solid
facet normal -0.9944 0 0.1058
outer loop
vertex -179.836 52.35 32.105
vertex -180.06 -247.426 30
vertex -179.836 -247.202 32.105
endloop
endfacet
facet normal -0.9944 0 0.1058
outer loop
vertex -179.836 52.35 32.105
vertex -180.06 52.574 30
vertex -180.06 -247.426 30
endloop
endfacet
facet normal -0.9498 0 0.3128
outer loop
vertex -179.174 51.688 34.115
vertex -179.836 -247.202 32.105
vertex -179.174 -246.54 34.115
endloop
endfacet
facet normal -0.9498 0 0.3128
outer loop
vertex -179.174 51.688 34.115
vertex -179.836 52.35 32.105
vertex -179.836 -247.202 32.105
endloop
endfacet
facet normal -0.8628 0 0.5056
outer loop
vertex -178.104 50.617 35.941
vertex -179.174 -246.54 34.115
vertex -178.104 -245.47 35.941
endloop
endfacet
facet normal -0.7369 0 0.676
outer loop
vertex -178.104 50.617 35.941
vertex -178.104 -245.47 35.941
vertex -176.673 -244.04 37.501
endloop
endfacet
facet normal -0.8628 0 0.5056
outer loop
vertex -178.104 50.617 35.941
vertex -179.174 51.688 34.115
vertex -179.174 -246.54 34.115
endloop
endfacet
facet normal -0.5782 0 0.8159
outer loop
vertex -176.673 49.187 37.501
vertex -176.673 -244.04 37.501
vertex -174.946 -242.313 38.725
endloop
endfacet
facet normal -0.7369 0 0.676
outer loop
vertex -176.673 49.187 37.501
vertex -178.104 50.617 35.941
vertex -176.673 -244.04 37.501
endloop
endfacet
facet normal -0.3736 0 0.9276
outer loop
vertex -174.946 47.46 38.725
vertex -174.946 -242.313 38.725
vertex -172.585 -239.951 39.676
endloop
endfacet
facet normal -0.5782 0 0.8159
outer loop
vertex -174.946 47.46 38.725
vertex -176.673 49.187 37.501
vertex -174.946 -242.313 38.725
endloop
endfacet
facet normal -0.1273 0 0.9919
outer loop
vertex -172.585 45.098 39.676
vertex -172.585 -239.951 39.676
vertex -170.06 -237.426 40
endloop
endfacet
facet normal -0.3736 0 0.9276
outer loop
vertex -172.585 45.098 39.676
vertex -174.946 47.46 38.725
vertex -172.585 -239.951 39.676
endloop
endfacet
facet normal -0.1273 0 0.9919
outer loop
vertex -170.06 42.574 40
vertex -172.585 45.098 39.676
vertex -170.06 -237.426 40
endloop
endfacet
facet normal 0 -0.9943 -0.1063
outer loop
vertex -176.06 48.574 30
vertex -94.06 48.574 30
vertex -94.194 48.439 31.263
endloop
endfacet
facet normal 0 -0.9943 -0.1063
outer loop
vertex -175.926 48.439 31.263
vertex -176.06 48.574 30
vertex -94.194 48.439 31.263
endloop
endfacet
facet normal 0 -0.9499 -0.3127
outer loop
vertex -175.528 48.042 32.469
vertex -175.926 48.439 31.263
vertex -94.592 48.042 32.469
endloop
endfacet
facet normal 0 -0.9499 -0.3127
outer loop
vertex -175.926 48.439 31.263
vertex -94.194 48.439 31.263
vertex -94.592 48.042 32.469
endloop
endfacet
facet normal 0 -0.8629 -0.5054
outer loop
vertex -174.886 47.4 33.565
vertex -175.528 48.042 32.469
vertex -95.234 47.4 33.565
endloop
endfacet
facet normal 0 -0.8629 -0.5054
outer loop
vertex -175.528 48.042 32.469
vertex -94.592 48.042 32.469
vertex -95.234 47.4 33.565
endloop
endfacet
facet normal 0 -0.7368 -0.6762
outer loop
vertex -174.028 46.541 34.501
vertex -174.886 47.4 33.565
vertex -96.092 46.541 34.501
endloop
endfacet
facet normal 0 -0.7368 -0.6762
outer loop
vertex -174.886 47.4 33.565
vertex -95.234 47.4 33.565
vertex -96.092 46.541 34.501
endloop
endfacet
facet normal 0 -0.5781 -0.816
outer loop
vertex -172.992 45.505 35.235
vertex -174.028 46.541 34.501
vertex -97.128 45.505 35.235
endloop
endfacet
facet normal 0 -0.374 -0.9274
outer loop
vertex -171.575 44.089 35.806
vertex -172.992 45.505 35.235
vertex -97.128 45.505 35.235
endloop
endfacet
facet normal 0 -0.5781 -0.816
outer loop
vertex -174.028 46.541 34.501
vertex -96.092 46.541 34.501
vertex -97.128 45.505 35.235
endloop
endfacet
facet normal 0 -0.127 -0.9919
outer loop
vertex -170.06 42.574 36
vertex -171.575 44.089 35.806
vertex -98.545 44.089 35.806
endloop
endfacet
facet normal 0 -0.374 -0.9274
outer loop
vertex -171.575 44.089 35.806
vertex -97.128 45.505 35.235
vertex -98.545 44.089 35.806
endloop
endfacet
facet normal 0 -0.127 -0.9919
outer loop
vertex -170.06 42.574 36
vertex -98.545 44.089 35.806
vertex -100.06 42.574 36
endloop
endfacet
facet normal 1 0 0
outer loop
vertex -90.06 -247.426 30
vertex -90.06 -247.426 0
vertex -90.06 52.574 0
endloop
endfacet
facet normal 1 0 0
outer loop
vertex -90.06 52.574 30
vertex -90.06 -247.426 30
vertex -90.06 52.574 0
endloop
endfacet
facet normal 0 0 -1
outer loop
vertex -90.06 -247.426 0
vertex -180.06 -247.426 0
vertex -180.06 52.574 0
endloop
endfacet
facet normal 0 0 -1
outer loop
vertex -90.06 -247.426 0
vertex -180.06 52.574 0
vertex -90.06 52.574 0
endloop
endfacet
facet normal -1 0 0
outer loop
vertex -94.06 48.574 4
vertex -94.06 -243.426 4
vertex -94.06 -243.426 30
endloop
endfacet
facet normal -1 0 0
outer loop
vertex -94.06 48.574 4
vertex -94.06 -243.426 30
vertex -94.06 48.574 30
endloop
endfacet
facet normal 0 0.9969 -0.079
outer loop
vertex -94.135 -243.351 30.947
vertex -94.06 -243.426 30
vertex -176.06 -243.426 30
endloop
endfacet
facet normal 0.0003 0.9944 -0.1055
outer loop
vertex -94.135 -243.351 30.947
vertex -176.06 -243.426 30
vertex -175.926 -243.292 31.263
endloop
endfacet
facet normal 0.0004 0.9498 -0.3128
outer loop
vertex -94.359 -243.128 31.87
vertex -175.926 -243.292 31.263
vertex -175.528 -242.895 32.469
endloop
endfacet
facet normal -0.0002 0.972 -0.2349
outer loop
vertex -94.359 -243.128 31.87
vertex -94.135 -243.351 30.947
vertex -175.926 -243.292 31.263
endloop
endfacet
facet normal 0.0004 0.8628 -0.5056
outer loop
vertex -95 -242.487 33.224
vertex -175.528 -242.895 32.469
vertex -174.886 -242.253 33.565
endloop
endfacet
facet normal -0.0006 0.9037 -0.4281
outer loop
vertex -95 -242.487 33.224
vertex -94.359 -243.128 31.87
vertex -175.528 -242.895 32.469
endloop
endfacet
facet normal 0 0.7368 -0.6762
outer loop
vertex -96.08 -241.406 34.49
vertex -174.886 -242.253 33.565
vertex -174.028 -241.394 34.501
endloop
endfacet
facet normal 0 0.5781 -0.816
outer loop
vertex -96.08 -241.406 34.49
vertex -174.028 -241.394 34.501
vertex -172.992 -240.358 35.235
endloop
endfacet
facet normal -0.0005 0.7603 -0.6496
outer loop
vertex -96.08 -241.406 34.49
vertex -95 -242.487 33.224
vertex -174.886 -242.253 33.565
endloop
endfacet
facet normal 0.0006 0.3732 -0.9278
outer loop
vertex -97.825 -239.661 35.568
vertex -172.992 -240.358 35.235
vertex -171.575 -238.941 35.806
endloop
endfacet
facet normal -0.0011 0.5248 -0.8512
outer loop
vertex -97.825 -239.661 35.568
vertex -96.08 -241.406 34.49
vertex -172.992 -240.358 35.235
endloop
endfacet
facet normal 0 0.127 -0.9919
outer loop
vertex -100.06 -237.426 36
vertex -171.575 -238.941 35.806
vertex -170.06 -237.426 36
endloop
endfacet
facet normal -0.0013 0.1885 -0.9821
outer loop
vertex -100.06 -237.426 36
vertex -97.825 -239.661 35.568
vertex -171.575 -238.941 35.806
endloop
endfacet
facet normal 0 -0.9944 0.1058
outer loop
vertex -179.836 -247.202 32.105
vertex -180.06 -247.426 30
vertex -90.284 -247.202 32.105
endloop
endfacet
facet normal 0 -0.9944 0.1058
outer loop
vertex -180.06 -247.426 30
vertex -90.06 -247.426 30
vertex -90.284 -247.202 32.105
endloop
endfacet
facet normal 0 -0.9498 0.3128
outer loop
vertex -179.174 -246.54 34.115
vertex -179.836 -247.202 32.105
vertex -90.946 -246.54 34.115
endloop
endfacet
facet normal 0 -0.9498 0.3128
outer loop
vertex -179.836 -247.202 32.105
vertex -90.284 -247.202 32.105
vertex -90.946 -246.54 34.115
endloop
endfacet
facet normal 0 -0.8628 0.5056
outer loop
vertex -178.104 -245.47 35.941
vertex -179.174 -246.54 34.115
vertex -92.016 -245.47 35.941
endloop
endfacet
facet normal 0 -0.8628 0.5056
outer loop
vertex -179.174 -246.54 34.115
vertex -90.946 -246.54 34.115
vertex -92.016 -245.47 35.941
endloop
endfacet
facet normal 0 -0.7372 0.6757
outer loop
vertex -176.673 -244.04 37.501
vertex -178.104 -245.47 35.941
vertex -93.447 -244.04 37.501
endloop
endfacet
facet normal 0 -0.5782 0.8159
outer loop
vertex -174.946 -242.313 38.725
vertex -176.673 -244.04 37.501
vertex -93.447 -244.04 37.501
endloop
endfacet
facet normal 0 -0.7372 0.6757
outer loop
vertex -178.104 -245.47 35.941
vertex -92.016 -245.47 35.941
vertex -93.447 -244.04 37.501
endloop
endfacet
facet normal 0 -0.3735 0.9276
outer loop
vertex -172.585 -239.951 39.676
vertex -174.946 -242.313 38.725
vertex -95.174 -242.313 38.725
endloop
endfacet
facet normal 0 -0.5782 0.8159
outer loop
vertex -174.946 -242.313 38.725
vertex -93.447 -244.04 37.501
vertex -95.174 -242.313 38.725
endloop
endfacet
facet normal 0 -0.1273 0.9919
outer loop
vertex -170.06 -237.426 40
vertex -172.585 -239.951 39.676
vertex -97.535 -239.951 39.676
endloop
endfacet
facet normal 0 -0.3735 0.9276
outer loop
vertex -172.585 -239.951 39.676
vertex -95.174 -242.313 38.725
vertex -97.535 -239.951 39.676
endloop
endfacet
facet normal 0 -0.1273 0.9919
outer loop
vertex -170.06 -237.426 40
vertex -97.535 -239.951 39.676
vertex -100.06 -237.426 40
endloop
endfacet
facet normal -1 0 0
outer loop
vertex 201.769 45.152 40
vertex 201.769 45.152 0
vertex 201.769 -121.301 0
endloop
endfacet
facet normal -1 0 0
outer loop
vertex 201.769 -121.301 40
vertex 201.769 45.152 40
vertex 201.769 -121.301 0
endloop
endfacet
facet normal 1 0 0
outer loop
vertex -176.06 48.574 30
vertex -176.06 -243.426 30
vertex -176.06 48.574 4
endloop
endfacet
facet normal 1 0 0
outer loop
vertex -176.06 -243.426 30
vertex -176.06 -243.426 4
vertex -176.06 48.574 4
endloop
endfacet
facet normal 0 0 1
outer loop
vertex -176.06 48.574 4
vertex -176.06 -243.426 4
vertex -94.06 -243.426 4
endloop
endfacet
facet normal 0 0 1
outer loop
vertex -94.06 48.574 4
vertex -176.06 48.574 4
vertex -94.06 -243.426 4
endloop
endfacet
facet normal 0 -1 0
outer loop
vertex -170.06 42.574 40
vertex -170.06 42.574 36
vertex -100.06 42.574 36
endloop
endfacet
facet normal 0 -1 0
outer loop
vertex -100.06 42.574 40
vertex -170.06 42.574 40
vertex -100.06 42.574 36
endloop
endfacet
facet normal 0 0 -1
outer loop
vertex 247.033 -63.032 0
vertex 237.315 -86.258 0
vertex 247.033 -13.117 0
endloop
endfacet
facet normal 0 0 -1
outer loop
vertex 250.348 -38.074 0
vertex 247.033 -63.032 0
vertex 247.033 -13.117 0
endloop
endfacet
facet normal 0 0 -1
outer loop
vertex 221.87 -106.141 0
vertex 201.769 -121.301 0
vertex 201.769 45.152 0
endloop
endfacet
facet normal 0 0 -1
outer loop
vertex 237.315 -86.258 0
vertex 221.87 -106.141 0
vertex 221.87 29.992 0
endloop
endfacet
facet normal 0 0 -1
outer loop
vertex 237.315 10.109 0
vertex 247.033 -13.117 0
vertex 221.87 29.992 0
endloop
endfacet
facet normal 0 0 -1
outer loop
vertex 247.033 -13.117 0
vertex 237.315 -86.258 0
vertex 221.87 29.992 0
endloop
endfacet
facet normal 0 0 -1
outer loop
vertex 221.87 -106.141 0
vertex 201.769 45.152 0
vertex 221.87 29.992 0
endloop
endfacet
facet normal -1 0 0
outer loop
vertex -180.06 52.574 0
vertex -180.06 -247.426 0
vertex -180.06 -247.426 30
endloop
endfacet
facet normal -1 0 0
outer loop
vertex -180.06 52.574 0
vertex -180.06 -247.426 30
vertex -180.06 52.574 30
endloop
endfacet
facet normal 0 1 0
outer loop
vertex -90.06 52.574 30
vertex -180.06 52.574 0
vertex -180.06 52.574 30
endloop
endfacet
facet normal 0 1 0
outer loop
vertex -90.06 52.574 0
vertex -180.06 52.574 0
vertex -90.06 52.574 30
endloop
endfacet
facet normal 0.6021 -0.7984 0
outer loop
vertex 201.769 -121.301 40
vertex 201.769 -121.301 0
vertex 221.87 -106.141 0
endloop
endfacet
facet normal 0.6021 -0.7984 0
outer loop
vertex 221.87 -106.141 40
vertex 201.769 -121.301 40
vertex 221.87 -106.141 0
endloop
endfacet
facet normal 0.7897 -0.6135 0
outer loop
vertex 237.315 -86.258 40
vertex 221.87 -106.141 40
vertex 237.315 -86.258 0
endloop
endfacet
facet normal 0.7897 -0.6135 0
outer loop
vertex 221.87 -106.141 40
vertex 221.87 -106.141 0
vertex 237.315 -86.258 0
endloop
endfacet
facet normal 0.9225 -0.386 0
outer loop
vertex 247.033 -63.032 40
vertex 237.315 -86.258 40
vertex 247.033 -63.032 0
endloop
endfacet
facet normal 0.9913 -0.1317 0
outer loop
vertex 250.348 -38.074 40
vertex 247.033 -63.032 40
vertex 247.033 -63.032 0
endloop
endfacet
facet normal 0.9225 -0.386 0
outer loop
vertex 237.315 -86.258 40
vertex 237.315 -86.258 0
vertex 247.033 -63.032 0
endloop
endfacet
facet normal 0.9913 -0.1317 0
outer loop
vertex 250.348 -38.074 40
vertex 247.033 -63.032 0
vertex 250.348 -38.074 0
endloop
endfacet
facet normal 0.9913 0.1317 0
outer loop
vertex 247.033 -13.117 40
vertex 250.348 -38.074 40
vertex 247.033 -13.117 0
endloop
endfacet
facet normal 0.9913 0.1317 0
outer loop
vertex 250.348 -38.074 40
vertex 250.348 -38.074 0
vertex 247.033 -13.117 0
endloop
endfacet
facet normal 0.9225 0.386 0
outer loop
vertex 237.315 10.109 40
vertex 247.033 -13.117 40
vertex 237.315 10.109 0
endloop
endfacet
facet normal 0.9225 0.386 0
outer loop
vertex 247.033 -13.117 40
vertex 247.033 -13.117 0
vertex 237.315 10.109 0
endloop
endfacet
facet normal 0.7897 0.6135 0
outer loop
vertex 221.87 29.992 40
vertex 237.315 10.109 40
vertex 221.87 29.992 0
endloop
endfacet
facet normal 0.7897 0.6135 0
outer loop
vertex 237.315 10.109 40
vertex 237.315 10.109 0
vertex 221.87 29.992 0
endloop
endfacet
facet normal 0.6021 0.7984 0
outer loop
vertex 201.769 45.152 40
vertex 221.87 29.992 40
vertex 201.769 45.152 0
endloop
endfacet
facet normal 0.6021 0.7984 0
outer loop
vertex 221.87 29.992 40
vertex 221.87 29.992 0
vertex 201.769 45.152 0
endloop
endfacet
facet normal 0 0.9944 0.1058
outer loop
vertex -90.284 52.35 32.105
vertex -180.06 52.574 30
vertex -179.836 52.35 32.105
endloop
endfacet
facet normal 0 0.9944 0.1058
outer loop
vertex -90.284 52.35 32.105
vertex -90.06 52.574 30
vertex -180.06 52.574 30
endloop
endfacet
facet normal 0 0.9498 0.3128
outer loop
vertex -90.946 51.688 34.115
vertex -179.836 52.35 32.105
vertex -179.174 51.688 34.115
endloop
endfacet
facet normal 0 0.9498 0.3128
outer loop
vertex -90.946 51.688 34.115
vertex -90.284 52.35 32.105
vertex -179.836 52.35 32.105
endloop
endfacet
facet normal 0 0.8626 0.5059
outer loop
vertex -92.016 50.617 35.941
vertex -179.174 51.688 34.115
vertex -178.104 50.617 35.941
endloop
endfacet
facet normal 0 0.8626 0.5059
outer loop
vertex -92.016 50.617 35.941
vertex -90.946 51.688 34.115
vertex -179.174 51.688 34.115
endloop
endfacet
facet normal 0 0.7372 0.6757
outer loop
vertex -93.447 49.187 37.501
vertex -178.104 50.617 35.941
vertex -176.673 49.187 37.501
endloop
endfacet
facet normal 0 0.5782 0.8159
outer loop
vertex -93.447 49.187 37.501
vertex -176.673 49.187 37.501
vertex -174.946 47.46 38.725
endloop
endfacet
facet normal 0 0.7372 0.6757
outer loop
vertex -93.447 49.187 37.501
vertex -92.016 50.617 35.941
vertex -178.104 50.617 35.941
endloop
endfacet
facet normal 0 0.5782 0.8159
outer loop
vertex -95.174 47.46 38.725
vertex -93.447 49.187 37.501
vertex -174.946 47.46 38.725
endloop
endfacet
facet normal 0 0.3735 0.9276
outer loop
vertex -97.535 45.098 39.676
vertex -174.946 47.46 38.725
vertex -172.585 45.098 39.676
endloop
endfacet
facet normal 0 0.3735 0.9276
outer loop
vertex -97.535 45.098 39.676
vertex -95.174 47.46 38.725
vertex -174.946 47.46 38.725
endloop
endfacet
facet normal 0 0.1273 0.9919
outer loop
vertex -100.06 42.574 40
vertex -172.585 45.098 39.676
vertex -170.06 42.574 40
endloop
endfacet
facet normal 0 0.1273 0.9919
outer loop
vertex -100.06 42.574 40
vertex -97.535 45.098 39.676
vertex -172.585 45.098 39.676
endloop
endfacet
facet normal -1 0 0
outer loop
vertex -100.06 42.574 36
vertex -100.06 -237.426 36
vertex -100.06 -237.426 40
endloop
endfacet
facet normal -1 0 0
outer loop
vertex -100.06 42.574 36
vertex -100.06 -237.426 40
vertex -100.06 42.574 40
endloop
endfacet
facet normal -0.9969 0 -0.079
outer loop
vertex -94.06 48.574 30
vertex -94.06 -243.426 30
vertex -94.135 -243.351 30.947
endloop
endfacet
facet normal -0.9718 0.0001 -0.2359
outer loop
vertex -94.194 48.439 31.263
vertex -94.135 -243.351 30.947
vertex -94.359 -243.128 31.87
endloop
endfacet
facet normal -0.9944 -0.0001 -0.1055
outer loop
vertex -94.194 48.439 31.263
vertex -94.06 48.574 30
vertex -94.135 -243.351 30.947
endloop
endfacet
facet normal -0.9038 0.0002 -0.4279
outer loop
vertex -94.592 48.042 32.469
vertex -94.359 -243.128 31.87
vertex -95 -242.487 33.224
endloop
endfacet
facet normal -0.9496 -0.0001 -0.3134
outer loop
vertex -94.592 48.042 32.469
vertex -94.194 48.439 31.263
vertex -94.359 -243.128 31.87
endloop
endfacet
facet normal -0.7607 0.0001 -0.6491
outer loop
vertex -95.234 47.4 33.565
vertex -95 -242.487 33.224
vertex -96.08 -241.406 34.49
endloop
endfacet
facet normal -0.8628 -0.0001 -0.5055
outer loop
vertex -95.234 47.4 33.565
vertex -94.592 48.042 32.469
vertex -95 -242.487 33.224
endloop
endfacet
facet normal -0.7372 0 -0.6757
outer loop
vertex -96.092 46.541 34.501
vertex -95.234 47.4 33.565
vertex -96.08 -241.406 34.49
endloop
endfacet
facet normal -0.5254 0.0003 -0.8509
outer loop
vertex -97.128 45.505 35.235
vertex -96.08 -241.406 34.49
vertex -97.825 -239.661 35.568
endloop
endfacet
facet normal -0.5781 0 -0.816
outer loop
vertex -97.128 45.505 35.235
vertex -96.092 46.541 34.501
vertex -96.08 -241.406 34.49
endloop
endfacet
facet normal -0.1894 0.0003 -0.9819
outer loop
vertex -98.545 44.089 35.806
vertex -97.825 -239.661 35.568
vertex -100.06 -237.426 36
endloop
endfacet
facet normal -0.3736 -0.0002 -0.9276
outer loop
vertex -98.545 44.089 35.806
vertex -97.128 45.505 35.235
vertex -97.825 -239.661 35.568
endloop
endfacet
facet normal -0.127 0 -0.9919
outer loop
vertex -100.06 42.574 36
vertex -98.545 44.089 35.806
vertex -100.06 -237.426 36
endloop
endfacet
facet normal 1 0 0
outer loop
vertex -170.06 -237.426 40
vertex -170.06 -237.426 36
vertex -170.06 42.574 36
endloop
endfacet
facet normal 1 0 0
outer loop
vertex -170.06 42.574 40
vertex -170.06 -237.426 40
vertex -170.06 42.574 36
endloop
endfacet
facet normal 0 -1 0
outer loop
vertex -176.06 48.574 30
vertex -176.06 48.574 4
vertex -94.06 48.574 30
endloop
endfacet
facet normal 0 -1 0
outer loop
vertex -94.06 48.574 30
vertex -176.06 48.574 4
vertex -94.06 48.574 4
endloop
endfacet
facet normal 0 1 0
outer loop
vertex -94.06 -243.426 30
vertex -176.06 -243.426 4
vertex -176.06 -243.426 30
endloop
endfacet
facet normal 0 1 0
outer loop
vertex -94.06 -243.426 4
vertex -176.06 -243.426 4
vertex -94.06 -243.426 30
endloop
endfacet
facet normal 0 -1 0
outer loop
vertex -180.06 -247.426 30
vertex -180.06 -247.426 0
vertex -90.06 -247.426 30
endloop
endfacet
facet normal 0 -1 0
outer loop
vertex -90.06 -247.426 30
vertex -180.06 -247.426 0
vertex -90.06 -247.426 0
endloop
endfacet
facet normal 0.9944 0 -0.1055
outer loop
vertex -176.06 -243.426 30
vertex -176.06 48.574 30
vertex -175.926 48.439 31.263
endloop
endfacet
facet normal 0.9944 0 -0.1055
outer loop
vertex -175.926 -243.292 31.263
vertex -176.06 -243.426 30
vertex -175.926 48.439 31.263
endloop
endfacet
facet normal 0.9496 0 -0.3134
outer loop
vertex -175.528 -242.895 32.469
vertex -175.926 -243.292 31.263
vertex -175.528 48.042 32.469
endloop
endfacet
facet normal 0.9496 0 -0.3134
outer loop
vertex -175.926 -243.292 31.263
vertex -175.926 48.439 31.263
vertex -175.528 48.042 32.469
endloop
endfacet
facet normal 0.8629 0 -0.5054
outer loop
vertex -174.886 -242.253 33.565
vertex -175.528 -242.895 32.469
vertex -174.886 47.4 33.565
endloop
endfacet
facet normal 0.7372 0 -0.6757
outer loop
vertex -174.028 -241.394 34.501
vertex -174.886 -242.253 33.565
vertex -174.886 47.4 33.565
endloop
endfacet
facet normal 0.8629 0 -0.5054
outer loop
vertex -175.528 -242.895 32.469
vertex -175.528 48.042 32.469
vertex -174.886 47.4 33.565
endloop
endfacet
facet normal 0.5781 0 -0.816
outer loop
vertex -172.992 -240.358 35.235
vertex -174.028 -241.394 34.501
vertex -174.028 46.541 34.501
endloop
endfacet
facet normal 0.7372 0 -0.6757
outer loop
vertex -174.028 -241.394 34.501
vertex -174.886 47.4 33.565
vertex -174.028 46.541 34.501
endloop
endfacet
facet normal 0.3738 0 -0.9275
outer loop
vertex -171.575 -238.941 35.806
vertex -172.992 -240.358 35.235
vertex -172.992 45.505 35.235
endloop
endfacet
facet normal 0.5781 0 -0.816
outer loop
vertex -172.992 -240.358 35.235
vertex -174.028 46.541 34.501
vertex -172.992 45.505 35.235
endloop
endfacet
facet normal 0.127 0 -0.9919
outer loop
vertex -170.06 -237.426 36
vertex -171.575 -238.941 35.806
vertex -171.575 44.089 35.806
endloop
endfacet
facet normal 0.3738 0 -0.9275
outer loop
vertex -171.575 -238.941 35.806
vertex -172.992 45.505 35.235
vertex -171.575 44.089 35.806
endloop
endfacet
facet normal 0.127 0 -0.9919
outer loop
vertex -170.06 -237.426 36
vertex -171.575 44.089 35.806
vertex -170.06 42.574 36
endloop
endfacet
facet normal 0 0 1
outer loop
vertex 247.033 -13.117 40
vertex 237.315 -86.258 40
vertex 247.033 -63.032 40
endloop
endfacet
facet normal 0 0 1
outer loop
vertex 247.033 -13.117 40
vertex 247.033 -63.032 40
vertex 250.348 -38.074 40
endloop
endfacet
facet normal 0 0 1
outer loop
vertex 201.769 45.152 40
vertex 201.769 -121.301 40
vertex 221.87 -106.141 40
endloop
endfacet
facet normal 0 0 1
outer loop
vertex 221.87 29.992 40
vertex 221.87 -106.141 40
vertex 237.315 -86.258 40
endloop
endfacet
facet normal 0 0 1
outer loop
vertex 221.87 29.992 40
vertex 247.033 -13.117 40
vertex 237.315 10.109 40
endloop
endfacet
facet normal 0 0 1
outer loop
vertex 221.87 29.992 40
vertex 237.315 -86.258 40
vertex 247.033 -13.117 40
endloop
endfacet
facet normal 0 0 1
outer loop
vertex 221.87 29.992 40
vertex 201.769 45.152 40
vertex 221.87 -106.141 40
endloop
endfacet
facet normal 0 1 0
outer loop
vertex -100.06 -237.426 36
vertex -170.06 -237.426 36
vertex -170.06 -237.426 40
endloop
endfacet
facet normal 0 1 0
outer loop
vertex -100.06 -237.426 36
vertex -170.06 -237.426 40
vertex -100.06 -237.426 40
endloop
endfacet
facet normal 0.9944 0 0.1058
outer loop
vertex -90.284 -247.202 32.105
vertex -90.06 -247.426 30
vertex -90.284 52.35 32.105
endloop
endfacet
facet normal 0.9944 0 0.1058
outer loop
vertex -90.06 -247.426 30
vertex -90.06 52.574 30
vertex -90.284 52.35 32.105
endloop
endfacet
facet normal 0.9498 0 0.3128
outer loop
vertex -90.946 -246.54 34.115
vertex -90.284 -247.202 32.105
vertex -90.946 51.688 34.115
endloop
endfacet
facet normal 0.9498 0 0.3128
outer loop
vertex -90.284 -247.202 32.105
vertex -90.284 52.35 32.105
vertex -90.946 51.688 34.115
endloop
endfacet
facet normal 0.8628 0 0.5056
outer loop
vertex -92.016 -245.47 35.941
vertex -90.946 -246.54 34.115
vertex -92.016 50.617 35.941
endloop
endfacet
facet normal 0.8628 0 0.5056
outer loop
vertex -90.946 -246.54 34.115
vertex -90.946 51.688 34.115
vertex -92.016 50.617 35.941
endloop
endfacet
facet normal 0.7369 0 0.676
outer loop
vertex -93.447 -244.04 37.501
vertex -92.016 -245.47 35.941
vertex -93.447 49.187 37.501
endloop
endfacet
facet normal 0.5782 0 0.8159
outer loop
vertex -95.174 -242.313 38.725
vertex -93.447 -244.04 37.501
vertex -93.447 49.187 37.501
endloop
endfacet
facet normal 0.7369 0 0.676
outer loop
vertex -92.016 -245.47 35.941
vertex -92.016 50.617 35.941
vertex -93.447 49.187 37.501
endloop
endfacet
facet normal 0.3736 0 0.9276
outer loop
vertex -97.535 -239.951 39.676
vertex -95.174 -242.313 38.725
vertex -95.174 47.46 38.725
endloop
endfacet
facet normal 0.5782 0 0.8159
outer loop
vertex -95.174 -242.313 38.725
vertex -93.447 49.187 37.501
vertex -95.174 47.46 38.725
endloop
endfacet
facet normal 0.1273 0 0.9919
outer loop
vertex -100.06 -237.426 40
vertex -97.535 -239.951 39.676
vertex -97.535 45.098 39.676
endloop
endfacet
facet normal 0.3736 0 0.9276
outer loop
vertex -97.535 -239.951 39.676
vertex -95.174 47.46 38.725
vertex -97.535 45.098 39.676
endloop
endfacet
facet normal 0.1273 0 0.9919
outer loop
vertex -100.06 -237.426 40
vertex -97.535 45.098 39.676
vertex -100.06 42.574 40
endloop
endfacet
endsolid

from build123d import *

# Parameters (mm, degrees)
F0_W     = 90
F0_H     = 300
F1_DEPTH = 40
F2_R     = 10
F3_T     = -4
F5_DEPTH = 40


# Not quite as in the source:
# - a shell that OpenCascade refuses in one call is made with other operations: the cavity is built on its own and cut out


with BuildPart() as f1:
    # F0 (on Top) → F1 (new body)
    with BuildSketch(Plane.XY):
        with Locations((-135.0600157978, -97.4264368415)):
            Rectangle(F0_W, F0_H)
    extrude(amount=F1_DEPTH)

    # F2
    f2_edges = [f1.edges().sort_by_distance(p)[0] for p in [
        (-90.060016, -97.426437, 40),
        (-135.060016, -247.426437, 40),
        (-180.060016, -97.426437, 40),
        (-135.060016, 52.573563, 40),
    ]]
    fillet(f2_edges, radius=F2_R)

    # F3: a shell. OpenCascade refuses it in one call, so the cavity is built on its own and cut out:
    # the body offset inwards by the wall thickness, plus a prism from it out through each open face.
    f3_core = offset(f1.part, amount=F3_T, mode=Mode.PRIVATE)
    f3_exits = [f3_core.faces().sort_by_distance(p)[0] for p in [
        (-135.060016, -97.426437, 36),
    ]]
    add(f3_core, mode=Mode.SUBTRACT)
    extrude(f3_exits, amount=-F3_T, mode=Mode.SUBTRACT)


with BuildPart() as f5:
    # F4 (on Top) → F5 (new body)
    with BuildSketch(Plane.XY):
        with BuildLine():
            Line((201.7689708893, 45.1520286221), (201.7689708893, -121.3005959367))
            ThreePointArc((201.7689708893, -121.3005959367), (250.3483896515, -38.0742836573), (201.7689708893, 45.1520286221))
        make_face()
    extrude(amount=F5_DEPTH)


solid = Compound([f1.part, f5.part])
